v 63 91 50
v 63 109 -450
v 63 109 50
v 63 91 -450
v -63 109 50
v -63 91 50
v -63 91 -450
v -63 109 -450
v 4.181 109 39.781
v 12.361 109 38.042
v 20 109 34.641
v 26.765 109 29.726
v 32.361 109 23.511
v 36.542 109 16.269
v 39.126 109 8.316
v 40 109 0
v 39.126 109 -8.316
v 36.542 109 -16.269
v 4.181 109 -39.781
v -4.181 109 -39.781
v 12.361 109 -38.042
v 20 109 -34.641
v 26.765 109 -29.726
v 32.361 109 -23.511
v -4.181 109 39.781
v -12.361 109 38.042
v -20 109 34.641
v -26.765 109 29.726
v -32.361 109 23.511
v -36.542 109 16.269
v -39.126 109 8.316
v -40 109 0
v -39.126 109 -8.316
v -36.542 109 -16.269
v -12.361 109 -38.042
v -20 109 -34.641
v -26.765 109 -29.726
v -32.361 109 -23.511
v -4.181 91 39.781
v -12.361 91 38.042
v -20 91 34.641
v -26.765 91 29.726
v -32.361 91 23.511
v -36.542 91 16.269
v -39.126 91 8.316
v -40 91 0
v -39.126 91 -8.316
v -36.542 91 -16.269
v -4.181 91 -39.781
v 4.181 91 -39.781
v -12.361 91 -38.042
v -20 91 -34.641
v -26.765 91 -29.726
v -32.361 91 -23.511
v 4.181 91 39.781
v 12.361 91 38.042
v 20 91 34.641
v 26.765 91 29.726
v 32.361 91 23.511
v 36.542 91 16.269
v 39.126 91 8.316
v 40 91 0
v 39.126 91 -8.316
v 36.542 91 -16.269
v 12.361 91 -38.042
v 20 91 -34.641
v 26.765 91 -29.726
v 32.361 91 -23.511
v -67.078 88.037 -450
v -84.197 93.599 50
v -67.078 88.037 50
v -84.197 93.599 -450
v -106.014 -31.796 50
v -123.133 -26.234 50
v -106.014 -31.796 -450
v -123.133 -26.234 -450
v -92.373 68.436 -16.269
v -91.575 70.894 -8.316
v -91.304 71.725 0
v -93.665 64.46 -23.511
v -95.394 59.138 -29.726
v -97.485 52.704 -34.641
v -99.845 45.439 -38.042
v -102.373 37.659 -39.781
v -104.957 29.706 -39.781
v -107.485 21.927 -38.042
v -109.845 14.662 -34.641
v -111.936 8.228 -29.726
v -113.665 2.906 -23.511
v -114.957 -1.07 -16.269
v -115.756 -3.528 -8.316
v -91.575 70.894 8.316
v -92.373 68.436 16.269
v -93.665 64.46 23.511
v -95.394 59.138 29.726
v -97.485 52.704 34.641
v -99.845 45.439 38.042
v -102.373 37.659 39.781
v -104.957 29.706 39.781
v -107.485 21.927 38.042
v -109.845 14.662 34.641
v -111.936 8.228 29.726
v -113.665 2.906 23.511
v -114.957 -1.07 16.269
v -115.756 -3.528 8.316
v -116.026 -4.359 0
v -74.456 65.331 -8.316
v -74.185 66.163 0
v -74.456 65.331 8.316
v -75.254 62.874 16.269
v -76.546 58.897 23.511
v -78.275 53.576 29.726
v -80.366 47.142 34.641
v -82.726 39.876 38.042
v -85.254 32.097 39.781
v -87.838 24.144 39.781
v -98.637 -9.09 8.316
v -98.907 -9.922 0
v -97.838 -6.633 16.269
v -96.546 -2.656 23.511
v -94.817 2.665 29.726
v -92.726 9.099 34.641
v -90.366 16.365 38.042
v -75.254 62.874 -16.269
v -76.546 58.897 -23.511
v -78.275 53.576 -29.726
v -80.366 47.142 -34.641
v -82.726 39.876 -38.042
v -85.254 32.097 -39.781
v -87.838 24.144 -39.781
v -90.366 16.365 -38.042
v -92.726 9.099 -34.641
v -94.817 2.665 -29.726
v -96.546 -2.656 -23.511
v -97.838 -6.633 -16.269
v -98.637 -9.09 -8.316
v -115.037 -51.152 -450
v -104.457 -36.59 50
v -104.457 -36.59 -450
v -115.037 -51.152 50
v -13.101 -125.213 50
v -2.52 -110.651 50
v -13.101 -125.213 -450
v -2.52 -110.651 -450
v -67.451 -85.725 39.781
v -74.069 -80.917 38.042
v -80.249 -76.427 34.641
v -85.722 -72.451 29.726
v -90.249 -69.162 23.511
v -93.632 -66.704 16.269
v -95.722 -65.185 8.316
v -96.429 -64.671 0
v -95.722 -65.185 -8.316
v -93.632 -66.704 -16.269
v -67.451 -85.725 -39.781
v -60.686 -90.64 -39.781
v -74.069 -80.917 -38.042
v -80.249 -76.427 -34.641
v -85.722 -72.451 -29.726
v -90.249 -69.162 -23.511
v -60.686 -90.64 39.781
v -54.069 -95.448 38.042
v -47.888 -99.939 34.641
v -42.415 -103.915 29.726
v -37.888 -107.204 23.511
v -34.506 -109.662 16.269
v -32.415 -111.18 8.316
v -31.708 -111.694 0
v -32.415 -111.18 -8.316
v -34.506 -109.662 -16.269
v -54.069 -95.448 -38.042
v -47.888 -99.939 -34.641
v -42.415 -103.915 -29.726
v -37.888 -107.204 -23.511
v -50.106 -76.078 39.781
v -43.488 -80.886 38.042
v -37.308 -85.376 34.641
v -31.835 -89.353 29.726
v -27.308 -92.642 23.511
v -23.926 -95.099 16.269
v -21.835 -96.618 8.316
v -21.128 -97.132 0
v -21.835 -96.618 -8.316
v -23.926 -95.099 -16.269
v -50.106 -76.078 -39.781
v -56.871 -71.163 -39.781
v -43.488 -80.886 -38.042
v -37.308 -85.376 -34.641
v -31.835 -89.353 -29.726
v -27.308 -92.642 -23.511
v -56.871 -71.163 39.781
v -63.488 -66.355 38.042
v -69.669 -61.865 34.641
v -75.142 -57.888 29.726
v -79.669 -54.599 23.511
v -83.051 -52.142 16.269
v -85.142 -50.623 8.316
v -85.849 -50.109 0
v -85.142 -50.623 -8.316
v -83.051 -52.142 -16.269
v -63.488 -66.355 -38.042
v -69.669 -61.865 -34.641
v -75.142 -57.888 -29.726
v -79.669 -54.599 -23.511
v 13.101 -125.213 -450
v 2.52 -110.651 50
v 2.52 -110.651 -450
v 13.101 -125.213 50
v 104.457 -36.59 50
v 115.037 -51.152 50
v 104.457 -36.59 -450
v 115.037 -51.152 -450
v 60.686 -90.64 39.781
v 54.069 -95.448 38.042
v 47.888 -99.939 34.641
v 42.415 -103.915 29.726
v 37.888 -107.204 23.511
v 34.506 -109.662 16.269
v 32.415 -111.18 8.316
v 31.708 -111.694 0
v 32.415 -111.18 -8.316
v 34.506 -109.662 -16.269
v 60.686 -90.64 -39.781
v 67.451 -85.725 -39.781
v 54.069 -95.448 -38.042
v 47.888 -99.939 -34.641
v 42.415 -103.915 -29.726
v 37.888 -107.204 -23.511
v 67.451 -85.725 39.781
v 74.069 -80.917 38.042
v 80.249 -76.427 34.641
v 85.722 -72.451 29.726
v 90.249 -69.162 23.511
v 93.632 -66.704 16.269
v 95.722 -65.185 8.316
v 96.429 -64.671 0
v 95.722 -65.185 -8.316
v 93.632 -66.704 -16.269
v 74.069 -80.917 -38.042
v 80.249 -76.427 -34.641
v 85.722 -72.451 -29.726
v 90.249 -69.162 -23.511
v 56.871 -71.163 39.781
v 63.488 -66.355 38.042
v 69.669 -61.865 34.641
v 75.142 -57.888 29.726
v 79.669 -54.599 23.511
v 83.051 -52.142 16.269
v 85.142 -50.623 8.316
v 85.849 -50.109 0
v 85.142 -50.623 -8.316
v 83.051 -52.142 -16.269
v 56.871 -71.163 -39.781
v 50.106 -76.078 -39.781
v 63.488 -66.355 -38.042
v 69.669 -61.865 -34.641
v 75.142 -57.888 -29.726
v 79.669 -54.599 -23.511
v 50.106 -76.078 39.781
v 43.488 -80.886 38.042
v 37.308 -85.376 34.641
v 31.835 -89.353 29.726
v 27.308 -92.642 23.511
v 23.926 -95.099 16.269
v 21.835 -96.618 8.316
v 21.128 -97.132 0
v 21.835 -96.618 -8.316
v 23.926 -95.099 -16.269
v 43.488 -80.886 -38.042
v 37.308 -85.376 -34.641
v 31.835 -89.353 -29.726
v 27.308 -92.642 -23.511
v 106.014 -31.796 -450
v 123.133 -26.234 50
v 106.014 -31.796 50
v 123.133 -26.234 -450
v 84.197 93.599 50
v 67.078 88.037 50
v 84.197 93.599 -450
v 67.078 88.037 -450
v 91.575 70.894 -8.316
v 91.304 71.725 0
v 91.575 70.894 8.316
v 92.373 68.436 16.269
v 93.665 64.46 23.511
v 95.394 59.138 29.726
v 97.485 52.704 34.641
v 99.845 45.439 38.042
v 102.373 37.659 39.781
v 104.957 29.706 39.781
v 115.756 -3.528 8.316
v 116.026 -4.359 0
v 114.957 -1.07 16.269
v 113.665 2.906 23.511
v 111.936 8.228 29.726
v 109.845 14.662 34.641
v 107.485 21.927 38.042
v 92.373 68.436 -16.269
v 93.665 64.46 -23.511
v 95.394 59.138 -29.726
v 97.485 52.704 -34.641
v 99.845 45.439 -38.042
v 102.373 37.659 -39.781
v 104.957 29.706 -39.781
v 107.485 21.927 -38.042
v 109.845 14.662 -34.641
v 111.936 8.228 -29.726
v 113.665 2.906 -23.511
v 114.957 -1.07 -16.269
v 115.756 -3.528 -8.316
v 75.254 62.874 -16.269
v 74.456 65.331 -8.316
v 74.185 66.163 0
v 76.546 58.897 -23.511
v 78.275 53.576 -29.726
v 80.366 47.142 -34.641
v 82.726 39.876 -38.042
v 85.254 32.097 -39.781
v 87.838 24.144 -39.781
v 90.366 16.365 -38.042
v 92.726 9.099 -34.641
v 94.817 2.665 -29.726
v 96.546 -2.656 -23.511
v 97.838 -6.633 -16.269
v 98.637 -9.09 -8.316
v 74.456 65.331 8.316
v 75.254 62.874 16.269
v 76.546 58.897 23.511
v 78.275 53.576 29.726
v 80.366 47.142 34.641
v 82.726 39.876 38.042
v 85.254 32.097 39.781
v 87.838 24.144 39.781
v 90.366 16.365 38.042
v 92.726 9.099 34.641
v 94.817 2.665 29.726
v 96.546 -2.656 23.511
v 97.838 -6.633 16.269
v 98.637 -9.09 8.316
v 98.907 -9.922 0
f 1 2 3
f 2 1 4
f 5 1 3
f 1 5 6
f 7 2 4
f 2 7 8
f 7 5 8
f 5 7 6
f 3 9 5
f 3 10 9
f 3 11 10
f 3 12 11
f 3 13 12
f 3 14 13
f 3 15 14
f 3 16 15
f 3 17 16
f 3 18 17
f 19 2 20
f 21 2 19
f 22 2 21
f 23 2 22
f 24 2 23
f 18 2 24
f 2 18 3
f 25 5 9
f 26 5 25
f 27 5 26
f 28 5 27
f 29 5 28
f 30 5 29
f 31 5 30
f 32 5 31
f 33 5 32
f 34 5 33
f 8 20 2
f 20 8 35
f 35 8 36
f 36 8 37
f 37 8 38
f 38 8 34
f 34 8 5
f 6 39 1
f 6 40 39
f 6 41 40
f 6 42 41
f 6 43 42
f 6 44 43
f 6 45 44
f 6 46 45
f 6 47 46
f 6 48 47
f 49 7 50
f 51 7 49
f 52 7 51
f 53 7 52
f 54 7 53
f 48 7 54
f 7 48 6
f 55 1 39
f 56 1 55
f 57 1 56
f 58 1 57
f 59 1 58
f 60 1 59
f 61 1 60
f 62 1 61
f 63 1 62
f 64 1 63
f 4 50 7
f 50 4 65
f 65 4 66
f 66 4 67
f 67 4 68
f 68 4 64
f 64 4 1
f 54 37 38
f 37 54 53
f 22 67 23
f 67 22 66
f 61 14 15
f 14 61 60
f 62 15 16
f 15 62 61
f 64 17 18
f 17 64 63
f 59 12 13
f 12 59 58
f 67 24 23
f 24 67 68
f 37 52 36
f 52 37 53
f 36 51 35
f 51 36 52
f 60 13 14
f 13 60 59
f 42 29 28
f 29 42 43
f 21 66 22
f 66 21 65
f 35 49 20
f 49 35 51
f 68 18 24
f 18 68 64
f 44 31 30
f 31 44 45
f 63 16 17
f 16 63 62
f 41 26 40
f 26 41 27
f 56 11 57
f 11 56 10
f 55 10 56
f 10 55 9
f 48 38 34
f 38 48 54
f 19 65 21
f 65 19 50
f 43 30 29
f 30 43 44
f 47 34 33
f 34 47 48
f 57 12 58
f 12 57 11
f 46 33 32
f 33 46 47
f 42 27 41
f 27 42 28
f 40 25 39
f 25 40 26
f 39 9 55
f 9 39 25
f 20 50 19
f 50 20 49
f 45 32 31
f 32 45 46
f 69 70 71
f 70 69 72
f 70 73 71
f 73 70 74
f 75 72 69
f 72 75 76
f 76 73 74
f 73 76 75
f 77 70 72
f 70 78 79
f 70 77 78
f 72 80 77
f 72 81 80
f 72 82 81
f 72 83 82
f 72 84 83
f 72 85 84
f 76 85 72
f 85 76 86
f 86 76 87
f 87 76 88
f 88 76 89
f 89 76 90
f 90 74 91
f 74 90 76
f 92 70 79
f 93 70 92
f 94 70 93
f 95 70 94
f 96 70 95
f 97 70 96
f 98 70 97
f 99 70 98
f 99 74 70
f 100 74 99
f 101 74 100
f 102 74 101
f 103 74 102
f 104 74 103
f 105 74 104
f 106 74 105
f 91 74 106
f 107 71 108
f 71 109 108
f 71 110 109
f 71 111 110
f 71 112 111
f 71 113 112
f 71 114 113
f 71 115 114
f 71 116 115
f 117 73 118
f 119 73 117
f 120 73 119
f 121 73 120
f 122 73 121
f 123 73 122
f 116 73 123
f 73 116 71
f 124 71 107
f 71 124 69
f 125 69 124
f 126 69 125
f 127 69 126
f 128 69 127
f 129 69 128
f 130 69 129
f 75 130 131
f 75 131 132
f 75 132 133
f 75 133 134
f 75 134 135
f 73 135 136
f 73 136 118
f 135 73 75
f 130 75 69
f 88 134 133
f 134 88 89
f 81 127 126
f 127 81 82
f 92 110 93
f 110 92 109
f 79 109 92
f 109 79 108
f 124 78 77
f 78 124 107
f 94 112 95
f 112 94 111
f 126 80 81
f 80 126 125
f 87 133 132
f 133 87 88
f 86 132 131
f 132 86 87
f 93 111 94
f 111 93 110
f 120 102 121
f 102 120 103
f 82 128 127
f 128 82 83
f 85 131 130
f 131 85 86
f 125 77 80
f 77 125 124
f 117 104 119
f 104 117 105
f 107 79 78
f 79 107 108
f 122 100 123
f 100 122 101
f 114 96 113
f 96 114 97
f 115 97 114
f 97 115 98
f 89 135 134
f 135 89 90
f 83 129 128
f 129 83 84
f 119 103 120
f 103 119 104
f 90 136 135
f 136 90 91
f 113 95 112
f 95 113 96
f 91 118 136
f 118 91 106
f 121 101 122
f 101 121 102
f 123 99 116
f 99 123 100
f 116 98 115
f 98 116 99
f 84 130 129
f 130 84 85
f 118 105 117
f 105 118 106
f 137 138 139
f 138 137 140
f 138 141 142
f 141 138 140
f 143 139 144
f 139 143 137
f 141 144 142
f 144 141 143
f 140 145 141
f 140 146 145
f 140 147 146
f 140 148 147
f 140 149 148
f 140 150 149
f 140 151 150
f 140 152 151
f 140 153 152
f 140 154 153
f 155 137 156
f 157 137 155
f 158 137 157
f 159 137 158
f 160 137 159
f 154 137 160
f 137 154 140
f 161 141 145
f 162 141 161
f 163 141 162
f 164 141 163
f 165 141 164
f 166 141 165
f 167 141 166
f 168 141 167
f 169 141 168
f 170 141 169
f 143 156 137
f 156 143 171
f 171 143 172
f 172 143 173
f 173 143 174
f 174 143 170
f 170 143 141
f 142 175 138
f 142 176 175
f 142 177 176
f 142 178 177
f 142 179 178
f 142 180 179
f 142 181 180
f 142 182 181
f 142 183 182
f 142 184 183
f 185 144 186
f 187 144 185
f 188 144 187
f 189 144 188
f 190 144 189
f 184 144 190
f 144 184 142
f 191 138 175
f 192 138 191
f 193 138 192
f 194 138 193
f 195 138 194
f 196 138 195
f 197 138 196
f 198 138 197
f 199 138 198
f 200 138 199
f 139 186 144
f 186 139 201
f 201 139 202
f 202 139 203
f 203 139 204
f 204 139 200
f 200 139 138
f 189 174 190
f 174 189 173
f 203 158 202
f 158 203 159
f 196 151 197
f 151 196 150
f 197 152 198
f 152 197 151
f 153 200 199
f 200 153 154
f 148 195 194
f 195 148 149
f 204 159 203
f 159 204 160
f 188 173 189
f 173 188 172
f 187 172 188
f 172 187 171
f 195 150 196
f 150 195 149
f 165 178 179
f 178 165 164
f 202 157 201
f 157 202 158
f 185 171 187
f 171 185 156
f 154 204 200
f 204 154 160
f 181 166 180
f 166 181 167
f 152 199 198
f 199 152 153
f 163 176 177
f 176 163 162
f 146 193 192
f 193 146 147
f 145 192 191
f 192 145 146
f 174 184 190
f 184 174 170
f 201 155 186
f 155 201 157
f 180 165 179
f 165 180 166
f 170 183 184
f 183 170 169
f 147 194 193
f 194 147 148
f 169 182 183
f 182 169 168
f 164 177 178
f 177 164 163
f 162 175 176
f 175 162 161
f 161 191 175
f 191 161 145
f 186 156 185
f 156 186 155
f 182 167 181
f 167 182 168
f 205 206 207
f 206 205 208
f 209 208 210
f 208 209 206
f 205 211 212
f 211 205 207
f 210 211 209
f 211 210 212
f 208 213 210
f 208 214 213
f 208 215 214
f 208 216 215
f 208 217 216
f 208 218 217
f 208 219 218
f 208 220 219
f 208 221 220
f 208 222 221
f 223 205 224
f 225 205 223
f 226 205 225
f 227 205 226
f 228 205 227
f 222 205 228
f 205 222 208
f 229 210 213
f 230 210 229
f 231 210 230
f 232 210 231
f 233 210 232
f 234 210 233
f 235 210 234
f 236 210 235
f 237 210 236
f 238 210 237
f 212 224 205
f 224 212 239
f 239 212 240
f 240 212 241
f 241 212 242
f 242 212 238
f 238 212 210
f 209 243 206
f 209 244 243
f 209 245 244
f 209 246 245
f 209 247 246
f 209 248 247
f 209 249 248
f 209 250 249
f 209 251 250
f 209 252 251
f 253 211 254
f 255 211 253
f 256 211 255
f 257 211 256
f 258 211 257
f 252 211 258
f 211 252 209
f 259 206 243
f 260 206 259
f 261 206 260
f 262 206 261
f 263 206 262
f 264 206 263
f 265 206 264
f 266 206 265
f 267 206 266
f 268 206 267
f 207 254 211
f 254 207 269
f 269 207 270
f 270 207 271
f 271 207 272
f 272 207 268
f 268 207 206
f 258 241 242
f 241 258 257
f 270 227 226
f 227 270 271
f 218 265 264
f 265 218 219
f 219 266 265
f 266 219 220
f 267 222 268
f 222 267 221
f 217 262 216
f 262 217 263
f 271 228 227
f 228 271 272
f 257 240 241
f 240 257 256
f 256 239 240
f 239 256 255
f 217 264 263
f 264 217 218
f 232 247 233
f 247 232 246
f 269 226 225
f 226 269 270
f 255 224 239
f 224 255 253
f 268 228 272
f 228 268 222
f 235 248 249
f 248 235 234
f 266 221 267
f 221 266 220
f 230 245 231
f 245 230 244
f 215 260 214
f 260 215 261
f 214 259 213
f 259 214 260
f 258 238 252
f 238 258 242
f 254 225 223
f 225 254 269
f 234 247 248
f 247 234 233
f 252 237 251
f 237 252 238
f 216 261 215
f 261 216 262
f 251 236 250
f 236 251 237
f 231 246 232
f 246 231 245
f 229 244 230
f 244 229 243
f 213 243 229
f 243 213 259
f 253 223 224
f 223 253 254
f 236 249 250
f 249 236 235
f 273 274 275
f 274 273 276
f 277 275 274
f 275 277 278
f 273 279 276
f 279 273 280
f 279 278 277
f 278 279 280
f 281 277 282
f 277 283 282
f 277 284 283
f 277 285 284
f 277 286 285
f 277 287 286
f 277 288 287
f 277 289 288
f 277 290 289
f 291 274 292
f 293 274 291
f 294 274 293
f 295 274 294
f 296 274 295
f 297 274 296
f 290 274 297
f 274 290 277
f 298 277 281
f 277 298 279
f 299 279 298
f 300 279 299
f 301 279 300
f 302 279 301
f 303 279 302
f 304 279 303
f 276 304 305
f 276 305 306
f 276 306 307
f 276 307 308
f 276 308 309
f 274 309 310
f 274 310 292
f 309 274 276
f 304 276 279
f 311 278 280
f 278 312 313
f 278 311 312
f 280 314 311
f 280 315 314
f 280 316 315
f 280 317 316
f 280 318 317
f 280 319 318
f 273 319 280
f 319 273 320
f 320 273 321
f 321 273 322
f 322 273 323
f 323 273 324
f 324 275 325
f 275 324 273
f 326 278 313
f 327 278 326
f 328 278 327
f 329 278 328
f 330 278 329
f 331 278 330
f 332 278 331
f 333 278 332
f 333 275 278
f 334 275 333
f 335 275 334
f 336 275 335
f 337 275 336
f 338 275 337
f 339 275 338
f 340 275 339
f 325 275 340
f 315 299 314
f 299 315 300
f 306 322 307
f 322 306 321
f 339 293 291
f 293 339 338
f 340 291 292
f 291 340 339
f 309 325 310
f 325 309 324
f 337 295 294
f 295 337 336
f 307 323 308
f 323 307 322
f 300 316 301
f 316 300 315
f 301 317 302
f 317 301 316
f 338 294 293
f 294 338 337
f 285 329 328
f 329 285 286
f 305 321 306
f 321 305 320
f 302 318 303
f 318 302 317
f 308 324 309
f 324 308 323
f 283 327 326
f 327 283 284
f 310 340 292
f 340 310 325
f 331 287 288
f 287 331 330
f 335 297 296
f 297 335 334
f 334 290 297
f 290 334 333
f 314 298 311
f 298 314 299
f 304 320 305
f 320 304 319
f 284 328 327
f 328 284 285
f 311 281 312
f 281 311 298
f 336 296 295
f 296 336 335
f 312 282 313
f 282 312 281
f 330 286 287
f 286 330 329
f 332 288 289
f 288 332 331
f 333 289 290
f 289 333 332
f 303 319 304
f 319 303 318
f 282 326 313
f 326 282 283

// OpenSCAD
N = 5;
D_SPEAKER = 80;

for (i = [0:N-1]) {
    rotate([0,0,i*360/N]) translate([0,100,0]) difference() {
        translate([0,0,-200]) cube([126,18,500], center=true);
        rotate([90,0,0]) {
            cylinder(20, d=D_SPEAKER, center=true);
        }
    }
}
